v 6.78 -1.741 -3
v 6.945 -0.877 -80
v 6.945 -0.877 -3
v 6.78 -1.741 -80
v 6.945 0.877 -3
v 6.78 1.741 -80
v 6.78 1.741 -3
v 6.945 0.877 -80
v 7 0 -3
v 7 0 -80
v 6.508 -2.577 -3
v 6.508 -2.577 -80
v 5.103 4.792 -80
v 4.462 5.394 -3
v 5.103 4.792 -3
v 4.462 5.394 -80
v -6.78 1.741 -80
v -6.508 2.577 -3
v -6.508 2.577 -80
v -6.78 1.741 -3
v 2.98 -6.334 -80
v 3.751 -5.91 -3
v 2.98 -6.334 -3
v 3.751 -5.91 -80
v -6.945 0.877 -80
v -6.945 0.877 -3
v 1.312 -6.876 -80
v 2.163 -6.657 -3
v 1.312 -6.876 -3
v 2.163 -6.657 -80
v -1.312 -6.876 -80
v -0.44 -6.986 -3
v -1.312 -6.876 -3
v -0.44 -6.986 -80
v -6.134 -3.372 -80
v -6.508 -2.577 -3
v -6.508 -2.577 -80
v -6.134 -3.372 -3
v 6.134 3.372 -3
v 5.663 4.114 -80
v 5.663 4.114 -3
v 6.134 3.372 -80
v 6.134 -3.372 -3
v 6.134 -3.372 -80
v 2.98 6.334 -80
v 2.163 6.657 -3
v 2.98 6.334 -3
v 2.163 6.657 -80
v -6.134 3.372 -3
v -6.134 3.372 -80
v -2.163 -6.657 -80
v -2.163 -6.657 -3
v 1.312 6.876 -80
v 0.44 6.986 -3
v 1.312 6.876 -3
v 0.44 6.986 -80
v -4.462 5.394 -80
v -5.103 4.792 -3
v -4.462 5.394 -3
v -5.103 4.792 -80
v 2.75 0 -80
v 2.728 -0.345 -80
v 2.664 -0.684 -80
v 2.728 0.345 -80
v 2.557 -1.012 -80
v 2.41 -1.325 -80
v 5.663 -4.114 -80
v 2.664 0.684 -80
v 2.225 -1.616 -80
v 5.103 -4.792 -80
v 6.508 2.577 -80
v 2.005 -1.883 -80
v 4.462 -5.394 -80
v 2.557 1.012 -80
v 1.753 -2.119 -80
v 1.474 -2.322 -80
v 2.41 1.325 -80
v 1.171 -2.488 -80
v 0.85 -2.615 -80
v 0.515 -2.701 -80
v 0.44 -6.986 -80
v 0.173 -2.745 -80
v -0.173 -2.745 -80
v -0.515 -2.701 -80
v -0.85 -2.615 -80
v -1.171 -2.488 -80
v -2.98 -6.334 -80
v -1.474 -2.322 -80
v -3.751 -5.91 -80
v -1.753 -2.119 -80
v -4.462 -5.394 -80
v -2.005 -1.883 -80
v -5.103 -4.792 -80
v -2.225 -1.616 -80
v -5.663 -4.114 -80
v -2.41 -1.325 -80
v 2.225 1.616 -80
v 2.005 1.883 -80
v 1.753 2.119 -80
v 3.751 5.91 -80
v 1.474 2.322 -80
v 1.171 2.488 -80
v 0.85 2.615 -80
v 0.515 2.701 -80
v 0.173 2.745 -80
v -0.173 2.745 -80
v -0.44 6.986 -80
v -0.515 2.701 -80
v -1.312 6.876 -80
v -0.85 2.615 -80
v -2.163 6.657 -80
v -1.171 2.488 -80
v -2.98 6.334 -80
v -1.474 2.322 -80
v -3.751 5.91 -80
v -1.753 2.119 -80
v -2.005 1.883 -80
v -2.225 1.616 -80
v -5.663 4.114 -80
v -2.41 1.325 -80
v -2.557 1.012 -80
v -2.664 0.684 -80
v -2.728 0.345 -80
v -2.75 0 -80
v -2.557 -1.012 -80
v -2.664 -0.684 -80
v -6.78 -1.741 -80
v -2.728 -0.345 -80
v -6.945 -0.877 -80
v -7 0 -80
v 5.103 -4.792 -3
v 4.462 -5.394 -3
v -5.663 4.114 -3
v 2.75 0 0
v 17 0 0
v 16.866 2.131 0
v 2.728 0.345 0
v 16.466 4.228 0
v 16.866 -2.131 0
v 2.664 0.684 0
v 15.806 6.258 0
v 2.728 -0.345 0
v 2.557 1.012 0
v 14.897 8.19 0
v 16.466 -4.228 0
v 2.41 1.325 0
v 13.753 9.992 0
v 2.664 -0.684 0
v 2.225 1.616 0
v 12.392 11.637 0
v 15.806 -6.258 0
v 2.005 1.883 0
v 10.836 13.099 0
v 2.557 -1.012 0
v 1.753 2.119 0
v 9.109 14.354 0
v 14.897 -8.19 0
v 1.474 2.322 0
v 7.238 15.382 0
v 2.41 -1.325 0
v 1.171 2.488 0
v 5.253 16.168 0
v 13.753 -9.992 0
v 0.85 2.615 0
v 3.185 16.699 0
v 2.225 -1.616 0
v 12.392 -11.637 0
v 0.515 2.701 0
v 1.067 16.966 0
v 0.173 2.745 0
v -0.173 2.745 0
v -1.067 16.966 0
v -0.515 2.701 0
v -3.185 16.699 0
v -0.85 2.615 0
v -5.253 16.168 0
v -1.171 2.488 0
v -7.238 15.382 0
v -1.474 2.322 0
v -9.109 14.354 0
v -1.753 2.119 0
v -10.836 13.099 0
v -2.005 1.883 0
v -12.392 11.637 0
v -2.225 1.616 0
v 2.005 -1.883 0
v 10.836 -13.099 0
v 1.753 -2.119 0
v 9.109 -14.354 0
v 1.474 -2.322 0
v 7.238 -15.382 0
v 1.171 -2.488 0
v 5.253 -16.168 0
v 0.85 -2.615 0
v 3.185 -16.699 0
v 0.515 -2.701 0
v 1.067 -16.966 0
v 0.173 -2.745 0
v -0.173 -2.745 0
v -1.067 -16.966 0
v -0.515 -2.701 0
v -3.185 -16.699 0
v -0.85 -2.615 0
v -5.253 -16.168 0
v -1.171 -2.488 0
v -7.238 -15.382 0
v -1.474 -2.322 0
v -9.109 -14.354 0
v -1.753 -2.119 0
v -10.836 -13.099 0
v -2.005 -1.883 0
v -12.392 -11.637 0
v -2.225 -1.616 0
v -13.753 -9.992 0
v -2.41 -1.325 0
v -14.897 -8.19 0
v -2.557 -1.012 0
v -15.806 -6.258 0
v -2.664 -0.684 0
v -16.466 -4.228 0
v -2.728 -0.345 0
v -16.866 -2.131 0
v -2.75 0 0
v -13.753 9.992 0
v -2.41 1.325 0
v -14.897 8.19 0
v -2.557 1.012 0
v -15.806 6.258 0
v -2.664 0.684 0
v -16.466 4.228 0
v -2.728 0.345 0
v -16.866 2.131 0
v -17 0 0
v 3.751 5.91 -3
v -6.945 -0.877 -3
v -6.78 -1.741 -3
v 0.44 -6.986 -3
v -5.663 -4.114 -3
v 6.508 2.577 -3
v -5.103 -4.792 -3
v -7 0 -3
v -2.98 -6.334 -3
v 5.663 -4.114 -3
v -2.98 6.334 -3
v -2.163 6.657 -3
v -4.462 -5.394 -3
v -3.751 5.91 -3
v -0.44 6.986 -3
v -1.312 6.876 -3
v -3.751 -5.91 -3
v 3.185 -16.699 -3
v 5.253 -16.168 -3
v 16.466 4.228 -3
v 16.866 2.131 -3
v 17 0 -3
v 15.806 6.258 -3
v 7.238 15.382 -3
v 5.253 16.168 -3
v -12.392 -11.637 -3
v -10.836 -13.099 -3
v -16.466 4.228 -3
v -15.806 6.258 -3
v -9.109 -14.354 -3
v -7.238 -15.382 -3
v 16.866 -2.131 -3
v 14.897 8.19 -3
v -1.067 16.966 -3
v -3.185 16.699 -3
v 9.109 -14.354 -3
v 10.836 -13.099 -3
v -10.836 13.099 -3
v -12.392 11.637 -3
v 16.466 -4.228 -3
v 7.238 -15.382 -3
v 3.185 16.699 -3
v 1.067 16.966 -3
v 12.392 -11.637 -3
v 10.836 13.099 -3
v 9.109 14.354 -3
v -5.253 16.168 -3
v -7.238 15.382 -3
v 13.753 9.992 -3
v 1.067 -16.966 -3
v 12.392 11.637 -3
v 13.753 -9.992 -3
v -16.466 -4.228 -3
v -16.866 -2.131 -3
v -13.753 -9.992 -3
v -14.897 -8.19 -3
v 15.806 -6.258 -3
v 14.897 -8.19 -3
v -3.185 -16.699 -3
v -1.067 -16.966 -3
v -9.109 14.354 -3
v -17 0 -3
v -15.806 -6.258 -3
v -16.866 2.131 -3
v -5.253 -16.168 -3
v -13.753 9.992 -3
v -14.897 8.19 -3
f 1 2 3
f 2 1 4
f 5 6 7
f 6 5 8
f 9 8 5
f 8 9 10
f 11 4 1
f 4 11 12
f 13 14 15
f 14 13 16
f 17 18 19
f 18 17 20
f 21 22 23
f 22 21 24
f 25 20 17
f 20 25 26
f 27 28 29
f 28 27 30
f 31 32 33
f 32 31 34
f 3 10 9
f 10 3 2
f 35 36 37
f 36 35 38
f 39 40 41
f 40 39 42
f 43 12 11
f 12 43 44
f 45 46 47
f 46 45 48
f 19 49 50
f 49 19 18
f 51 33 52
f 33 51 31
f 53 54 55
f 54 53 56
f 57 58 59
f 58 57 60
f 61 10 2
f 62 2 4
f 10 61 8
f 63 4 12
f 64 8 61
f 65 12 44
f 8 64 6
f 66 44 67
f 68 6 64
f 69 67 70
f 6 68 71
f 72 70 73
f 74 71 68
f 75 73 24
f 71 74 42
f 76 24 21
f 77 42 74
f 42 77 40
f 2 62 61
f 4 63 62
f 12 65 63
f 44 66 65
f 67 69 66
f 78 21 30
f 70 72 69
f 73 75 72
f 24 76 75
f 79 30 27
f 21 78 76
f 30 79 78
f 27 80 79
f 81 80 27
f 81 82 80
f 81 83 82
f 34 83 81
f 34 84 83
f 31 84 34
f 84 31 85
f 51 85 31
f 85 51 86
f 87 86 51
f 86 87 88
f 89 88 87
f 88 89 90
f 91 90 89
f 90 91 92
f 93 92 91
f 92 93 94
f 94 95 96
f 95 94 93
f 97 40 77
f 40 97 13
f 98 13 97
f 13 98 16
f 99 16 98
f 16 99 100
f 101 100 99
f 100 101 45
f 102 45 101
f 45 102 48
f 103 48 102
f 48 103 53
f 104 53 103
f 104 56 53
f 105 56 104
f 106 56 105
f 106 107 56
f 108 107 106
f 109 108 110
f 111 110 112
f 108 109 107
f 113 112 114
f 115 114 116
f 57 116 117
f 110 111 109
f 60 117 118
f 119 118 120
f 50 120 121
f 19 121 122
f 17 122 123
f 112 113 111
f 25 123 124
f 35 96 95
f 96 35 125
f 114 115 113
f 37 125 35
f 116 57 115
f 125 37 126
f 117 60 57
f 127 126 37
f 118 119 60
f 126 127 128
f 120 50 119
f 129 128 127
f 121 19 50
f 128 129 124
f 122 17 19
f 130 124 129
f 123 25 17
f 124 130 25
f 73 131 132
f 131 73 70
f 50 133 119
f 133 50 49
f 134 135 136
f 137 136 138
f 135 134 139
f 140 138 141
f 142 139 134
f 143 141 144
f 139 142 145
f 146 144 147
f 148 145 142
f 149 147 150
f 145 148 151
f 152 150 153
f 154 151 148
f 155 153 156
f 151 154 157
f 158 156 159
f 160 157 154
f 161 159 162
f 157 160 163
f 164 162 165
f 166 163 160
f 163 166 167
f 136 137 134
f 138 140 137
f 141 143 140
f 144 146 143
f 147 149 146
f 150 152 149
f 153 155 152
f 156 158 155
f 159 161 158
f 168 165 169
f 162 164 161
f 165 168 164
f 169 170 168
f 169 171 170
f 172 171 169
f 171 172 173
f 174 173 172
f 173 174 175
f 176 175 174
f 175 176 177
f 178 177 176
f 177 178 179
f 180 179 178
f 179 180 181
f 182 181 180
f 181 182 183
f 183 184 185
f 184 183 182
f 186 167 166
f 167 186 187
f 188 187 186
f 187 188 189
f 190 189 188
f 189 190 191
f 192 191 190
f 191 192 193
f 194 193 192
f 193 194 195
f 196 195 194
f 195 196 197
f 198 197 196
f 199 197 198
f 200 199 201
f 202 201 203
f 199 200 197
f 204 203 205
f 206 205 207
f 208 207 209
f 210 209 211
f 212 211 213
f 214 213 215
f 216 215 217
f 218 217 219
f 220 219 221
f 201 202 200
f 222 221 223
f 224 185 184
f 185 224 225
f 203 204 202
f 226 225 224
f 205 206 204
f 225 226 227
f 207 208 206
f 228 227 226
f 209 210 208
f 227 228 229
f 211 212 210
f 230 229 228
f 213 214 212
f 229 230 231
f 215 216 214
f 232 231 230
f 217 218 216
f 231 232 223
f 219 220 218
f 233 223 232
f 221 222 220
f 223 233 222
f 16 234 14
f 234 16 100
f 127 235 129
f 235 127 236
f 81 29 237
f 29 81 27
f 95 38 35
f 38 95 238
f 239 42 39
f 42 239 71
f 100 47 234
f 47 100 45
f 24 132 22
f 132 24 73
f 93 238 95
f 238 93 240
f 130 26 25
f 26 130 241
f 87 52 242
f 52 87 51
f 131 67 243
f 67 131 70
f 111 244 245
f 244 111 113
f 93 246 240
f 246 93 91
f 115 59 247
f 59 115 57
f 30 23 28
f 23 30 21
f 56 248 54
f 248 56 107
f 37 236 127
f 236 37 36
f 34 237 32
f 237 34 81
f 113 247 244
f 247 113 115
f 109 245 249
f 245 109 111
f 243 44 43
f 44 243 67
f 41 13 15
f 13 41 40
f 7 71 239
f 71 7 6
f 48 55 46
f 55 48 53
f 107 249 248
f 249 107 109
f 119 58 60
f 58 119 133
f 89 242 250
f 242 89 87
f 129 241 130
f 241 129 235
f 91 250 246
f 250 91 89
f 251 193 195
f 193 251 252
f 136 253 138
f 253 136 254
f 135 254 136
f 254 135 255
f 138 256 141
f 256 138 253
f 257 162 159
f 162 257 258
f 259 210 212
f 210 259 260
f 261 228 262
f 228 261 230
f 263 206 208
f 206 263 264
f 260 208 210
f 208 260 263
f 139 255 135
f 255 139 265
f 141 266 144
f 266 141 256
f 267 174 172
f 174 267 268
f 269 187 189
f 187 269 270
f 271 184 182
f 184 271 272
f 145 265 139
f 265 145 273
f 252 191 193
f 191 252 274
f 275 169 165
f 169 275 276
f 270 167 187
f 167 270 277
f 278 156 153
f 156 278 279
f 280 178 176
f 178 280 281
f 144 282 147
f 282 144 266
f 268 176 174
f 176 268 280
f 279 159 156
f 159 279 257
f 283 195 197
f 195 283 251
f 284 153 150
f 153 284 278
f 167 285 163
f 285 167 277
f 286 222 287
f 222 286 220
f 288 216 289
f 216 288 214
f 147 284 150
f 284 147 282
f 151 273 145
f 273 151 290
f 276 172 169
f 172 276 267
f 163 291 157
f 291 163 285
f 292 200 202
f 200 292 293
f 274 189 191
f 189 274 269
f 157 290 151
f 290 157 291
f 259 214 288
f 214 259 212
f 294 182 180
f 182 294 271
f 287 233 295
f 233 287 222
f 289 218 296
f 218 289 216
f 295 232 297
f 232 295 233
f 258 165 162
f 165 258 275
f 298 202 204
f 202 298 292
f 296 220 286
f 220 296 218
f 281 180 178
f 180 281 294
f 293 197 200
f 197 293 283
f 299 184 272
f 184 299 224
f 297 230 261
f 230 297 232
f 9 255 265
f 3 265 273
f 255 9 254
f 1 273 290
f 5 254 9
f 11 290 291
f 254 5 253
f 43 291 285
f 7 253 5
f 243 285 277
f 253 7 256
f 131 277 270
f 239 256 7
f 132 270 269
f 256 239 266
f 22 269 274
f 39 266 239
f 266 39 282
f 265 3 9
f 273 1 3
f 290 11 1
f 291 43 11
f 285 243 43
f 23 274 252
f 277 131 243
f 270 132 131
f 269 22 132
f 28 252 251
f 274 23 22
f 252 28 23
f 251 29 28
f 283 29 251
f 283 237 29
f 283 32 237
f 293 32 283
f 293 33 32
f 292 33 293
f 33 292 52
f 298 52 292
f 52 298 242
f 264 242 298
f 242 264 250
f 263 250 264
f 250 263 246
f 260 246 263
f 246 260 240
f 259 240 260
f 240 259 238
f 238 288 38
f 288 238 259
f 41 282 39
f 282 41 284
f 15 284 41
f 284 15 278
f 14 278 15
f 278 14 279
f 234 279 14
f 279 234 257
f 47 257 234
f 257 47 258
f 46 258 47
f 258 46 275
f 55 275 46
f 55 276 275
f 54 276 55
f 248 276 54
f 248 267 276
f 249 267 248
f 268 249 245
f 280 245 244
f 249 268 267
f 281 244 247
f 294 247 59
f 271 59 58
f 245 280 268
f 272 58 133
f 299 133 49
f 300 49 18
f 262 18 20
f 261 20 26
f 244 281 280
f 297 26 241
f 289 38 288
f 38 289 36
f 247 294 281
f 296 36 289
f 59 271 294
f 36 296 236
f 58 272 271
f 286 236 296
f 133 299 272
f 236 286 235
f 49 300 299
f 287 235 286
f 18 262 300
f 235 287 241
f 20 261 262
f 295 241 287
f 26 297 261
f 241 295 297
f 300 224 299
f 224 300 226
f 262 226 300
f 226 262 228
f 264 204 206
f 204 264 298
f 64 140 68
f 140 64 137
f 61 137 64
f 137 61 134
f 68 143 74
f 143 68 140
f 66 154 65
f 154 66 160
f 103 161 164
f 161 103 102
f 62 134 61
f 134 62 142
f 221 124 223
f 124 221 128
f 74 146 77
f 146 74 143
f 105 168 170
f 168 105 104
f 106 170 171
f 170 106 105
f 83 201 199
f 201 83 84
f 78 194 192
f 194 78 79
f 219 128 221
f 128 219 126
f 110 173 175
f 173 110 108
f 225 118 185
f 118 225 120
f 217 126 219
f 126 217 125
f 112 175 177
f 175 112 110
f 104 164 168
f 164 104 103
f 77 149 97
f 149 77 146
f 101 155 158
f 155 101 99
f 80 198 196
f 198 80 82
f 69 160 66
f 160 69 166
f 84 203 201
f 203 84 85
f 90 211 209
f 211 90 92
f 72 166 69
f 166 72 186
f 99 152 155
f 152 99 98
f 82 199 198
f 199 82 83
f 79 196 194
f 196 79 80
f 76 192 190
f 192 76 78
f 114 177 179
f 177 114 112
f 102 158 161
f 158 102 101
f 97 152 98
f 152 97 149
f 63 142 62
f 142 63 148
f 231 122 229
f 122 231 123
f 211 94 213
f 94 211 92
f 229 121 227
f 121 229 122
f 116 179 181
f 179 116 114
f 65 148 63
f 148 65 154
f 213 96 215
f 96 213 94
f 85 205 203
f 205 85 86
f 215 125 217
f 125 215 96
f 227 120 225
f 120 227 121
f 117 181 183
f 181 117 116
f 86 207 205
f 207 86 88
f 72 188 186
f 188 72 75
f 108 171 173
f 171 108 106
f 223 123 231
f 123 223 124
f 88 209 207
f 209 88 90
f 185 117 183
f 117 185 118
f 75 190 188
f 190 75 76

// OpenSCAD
$fn = 50;


difference() {
	union() {
		translate(v = [0, 0, -80.0000000000]) {
			cylinder(h = 80, r = 7.0000000000);
		}
		translate(v = [0, 0, -3.0000000000]) {
			cylinder(h = 3, r = 17.0000000000);
		}
	}
	union() {
		#translate(v = [0, 0, -80]) {
			cylinder(h = 80, r = 2.7500000000);
		}
	}
}
